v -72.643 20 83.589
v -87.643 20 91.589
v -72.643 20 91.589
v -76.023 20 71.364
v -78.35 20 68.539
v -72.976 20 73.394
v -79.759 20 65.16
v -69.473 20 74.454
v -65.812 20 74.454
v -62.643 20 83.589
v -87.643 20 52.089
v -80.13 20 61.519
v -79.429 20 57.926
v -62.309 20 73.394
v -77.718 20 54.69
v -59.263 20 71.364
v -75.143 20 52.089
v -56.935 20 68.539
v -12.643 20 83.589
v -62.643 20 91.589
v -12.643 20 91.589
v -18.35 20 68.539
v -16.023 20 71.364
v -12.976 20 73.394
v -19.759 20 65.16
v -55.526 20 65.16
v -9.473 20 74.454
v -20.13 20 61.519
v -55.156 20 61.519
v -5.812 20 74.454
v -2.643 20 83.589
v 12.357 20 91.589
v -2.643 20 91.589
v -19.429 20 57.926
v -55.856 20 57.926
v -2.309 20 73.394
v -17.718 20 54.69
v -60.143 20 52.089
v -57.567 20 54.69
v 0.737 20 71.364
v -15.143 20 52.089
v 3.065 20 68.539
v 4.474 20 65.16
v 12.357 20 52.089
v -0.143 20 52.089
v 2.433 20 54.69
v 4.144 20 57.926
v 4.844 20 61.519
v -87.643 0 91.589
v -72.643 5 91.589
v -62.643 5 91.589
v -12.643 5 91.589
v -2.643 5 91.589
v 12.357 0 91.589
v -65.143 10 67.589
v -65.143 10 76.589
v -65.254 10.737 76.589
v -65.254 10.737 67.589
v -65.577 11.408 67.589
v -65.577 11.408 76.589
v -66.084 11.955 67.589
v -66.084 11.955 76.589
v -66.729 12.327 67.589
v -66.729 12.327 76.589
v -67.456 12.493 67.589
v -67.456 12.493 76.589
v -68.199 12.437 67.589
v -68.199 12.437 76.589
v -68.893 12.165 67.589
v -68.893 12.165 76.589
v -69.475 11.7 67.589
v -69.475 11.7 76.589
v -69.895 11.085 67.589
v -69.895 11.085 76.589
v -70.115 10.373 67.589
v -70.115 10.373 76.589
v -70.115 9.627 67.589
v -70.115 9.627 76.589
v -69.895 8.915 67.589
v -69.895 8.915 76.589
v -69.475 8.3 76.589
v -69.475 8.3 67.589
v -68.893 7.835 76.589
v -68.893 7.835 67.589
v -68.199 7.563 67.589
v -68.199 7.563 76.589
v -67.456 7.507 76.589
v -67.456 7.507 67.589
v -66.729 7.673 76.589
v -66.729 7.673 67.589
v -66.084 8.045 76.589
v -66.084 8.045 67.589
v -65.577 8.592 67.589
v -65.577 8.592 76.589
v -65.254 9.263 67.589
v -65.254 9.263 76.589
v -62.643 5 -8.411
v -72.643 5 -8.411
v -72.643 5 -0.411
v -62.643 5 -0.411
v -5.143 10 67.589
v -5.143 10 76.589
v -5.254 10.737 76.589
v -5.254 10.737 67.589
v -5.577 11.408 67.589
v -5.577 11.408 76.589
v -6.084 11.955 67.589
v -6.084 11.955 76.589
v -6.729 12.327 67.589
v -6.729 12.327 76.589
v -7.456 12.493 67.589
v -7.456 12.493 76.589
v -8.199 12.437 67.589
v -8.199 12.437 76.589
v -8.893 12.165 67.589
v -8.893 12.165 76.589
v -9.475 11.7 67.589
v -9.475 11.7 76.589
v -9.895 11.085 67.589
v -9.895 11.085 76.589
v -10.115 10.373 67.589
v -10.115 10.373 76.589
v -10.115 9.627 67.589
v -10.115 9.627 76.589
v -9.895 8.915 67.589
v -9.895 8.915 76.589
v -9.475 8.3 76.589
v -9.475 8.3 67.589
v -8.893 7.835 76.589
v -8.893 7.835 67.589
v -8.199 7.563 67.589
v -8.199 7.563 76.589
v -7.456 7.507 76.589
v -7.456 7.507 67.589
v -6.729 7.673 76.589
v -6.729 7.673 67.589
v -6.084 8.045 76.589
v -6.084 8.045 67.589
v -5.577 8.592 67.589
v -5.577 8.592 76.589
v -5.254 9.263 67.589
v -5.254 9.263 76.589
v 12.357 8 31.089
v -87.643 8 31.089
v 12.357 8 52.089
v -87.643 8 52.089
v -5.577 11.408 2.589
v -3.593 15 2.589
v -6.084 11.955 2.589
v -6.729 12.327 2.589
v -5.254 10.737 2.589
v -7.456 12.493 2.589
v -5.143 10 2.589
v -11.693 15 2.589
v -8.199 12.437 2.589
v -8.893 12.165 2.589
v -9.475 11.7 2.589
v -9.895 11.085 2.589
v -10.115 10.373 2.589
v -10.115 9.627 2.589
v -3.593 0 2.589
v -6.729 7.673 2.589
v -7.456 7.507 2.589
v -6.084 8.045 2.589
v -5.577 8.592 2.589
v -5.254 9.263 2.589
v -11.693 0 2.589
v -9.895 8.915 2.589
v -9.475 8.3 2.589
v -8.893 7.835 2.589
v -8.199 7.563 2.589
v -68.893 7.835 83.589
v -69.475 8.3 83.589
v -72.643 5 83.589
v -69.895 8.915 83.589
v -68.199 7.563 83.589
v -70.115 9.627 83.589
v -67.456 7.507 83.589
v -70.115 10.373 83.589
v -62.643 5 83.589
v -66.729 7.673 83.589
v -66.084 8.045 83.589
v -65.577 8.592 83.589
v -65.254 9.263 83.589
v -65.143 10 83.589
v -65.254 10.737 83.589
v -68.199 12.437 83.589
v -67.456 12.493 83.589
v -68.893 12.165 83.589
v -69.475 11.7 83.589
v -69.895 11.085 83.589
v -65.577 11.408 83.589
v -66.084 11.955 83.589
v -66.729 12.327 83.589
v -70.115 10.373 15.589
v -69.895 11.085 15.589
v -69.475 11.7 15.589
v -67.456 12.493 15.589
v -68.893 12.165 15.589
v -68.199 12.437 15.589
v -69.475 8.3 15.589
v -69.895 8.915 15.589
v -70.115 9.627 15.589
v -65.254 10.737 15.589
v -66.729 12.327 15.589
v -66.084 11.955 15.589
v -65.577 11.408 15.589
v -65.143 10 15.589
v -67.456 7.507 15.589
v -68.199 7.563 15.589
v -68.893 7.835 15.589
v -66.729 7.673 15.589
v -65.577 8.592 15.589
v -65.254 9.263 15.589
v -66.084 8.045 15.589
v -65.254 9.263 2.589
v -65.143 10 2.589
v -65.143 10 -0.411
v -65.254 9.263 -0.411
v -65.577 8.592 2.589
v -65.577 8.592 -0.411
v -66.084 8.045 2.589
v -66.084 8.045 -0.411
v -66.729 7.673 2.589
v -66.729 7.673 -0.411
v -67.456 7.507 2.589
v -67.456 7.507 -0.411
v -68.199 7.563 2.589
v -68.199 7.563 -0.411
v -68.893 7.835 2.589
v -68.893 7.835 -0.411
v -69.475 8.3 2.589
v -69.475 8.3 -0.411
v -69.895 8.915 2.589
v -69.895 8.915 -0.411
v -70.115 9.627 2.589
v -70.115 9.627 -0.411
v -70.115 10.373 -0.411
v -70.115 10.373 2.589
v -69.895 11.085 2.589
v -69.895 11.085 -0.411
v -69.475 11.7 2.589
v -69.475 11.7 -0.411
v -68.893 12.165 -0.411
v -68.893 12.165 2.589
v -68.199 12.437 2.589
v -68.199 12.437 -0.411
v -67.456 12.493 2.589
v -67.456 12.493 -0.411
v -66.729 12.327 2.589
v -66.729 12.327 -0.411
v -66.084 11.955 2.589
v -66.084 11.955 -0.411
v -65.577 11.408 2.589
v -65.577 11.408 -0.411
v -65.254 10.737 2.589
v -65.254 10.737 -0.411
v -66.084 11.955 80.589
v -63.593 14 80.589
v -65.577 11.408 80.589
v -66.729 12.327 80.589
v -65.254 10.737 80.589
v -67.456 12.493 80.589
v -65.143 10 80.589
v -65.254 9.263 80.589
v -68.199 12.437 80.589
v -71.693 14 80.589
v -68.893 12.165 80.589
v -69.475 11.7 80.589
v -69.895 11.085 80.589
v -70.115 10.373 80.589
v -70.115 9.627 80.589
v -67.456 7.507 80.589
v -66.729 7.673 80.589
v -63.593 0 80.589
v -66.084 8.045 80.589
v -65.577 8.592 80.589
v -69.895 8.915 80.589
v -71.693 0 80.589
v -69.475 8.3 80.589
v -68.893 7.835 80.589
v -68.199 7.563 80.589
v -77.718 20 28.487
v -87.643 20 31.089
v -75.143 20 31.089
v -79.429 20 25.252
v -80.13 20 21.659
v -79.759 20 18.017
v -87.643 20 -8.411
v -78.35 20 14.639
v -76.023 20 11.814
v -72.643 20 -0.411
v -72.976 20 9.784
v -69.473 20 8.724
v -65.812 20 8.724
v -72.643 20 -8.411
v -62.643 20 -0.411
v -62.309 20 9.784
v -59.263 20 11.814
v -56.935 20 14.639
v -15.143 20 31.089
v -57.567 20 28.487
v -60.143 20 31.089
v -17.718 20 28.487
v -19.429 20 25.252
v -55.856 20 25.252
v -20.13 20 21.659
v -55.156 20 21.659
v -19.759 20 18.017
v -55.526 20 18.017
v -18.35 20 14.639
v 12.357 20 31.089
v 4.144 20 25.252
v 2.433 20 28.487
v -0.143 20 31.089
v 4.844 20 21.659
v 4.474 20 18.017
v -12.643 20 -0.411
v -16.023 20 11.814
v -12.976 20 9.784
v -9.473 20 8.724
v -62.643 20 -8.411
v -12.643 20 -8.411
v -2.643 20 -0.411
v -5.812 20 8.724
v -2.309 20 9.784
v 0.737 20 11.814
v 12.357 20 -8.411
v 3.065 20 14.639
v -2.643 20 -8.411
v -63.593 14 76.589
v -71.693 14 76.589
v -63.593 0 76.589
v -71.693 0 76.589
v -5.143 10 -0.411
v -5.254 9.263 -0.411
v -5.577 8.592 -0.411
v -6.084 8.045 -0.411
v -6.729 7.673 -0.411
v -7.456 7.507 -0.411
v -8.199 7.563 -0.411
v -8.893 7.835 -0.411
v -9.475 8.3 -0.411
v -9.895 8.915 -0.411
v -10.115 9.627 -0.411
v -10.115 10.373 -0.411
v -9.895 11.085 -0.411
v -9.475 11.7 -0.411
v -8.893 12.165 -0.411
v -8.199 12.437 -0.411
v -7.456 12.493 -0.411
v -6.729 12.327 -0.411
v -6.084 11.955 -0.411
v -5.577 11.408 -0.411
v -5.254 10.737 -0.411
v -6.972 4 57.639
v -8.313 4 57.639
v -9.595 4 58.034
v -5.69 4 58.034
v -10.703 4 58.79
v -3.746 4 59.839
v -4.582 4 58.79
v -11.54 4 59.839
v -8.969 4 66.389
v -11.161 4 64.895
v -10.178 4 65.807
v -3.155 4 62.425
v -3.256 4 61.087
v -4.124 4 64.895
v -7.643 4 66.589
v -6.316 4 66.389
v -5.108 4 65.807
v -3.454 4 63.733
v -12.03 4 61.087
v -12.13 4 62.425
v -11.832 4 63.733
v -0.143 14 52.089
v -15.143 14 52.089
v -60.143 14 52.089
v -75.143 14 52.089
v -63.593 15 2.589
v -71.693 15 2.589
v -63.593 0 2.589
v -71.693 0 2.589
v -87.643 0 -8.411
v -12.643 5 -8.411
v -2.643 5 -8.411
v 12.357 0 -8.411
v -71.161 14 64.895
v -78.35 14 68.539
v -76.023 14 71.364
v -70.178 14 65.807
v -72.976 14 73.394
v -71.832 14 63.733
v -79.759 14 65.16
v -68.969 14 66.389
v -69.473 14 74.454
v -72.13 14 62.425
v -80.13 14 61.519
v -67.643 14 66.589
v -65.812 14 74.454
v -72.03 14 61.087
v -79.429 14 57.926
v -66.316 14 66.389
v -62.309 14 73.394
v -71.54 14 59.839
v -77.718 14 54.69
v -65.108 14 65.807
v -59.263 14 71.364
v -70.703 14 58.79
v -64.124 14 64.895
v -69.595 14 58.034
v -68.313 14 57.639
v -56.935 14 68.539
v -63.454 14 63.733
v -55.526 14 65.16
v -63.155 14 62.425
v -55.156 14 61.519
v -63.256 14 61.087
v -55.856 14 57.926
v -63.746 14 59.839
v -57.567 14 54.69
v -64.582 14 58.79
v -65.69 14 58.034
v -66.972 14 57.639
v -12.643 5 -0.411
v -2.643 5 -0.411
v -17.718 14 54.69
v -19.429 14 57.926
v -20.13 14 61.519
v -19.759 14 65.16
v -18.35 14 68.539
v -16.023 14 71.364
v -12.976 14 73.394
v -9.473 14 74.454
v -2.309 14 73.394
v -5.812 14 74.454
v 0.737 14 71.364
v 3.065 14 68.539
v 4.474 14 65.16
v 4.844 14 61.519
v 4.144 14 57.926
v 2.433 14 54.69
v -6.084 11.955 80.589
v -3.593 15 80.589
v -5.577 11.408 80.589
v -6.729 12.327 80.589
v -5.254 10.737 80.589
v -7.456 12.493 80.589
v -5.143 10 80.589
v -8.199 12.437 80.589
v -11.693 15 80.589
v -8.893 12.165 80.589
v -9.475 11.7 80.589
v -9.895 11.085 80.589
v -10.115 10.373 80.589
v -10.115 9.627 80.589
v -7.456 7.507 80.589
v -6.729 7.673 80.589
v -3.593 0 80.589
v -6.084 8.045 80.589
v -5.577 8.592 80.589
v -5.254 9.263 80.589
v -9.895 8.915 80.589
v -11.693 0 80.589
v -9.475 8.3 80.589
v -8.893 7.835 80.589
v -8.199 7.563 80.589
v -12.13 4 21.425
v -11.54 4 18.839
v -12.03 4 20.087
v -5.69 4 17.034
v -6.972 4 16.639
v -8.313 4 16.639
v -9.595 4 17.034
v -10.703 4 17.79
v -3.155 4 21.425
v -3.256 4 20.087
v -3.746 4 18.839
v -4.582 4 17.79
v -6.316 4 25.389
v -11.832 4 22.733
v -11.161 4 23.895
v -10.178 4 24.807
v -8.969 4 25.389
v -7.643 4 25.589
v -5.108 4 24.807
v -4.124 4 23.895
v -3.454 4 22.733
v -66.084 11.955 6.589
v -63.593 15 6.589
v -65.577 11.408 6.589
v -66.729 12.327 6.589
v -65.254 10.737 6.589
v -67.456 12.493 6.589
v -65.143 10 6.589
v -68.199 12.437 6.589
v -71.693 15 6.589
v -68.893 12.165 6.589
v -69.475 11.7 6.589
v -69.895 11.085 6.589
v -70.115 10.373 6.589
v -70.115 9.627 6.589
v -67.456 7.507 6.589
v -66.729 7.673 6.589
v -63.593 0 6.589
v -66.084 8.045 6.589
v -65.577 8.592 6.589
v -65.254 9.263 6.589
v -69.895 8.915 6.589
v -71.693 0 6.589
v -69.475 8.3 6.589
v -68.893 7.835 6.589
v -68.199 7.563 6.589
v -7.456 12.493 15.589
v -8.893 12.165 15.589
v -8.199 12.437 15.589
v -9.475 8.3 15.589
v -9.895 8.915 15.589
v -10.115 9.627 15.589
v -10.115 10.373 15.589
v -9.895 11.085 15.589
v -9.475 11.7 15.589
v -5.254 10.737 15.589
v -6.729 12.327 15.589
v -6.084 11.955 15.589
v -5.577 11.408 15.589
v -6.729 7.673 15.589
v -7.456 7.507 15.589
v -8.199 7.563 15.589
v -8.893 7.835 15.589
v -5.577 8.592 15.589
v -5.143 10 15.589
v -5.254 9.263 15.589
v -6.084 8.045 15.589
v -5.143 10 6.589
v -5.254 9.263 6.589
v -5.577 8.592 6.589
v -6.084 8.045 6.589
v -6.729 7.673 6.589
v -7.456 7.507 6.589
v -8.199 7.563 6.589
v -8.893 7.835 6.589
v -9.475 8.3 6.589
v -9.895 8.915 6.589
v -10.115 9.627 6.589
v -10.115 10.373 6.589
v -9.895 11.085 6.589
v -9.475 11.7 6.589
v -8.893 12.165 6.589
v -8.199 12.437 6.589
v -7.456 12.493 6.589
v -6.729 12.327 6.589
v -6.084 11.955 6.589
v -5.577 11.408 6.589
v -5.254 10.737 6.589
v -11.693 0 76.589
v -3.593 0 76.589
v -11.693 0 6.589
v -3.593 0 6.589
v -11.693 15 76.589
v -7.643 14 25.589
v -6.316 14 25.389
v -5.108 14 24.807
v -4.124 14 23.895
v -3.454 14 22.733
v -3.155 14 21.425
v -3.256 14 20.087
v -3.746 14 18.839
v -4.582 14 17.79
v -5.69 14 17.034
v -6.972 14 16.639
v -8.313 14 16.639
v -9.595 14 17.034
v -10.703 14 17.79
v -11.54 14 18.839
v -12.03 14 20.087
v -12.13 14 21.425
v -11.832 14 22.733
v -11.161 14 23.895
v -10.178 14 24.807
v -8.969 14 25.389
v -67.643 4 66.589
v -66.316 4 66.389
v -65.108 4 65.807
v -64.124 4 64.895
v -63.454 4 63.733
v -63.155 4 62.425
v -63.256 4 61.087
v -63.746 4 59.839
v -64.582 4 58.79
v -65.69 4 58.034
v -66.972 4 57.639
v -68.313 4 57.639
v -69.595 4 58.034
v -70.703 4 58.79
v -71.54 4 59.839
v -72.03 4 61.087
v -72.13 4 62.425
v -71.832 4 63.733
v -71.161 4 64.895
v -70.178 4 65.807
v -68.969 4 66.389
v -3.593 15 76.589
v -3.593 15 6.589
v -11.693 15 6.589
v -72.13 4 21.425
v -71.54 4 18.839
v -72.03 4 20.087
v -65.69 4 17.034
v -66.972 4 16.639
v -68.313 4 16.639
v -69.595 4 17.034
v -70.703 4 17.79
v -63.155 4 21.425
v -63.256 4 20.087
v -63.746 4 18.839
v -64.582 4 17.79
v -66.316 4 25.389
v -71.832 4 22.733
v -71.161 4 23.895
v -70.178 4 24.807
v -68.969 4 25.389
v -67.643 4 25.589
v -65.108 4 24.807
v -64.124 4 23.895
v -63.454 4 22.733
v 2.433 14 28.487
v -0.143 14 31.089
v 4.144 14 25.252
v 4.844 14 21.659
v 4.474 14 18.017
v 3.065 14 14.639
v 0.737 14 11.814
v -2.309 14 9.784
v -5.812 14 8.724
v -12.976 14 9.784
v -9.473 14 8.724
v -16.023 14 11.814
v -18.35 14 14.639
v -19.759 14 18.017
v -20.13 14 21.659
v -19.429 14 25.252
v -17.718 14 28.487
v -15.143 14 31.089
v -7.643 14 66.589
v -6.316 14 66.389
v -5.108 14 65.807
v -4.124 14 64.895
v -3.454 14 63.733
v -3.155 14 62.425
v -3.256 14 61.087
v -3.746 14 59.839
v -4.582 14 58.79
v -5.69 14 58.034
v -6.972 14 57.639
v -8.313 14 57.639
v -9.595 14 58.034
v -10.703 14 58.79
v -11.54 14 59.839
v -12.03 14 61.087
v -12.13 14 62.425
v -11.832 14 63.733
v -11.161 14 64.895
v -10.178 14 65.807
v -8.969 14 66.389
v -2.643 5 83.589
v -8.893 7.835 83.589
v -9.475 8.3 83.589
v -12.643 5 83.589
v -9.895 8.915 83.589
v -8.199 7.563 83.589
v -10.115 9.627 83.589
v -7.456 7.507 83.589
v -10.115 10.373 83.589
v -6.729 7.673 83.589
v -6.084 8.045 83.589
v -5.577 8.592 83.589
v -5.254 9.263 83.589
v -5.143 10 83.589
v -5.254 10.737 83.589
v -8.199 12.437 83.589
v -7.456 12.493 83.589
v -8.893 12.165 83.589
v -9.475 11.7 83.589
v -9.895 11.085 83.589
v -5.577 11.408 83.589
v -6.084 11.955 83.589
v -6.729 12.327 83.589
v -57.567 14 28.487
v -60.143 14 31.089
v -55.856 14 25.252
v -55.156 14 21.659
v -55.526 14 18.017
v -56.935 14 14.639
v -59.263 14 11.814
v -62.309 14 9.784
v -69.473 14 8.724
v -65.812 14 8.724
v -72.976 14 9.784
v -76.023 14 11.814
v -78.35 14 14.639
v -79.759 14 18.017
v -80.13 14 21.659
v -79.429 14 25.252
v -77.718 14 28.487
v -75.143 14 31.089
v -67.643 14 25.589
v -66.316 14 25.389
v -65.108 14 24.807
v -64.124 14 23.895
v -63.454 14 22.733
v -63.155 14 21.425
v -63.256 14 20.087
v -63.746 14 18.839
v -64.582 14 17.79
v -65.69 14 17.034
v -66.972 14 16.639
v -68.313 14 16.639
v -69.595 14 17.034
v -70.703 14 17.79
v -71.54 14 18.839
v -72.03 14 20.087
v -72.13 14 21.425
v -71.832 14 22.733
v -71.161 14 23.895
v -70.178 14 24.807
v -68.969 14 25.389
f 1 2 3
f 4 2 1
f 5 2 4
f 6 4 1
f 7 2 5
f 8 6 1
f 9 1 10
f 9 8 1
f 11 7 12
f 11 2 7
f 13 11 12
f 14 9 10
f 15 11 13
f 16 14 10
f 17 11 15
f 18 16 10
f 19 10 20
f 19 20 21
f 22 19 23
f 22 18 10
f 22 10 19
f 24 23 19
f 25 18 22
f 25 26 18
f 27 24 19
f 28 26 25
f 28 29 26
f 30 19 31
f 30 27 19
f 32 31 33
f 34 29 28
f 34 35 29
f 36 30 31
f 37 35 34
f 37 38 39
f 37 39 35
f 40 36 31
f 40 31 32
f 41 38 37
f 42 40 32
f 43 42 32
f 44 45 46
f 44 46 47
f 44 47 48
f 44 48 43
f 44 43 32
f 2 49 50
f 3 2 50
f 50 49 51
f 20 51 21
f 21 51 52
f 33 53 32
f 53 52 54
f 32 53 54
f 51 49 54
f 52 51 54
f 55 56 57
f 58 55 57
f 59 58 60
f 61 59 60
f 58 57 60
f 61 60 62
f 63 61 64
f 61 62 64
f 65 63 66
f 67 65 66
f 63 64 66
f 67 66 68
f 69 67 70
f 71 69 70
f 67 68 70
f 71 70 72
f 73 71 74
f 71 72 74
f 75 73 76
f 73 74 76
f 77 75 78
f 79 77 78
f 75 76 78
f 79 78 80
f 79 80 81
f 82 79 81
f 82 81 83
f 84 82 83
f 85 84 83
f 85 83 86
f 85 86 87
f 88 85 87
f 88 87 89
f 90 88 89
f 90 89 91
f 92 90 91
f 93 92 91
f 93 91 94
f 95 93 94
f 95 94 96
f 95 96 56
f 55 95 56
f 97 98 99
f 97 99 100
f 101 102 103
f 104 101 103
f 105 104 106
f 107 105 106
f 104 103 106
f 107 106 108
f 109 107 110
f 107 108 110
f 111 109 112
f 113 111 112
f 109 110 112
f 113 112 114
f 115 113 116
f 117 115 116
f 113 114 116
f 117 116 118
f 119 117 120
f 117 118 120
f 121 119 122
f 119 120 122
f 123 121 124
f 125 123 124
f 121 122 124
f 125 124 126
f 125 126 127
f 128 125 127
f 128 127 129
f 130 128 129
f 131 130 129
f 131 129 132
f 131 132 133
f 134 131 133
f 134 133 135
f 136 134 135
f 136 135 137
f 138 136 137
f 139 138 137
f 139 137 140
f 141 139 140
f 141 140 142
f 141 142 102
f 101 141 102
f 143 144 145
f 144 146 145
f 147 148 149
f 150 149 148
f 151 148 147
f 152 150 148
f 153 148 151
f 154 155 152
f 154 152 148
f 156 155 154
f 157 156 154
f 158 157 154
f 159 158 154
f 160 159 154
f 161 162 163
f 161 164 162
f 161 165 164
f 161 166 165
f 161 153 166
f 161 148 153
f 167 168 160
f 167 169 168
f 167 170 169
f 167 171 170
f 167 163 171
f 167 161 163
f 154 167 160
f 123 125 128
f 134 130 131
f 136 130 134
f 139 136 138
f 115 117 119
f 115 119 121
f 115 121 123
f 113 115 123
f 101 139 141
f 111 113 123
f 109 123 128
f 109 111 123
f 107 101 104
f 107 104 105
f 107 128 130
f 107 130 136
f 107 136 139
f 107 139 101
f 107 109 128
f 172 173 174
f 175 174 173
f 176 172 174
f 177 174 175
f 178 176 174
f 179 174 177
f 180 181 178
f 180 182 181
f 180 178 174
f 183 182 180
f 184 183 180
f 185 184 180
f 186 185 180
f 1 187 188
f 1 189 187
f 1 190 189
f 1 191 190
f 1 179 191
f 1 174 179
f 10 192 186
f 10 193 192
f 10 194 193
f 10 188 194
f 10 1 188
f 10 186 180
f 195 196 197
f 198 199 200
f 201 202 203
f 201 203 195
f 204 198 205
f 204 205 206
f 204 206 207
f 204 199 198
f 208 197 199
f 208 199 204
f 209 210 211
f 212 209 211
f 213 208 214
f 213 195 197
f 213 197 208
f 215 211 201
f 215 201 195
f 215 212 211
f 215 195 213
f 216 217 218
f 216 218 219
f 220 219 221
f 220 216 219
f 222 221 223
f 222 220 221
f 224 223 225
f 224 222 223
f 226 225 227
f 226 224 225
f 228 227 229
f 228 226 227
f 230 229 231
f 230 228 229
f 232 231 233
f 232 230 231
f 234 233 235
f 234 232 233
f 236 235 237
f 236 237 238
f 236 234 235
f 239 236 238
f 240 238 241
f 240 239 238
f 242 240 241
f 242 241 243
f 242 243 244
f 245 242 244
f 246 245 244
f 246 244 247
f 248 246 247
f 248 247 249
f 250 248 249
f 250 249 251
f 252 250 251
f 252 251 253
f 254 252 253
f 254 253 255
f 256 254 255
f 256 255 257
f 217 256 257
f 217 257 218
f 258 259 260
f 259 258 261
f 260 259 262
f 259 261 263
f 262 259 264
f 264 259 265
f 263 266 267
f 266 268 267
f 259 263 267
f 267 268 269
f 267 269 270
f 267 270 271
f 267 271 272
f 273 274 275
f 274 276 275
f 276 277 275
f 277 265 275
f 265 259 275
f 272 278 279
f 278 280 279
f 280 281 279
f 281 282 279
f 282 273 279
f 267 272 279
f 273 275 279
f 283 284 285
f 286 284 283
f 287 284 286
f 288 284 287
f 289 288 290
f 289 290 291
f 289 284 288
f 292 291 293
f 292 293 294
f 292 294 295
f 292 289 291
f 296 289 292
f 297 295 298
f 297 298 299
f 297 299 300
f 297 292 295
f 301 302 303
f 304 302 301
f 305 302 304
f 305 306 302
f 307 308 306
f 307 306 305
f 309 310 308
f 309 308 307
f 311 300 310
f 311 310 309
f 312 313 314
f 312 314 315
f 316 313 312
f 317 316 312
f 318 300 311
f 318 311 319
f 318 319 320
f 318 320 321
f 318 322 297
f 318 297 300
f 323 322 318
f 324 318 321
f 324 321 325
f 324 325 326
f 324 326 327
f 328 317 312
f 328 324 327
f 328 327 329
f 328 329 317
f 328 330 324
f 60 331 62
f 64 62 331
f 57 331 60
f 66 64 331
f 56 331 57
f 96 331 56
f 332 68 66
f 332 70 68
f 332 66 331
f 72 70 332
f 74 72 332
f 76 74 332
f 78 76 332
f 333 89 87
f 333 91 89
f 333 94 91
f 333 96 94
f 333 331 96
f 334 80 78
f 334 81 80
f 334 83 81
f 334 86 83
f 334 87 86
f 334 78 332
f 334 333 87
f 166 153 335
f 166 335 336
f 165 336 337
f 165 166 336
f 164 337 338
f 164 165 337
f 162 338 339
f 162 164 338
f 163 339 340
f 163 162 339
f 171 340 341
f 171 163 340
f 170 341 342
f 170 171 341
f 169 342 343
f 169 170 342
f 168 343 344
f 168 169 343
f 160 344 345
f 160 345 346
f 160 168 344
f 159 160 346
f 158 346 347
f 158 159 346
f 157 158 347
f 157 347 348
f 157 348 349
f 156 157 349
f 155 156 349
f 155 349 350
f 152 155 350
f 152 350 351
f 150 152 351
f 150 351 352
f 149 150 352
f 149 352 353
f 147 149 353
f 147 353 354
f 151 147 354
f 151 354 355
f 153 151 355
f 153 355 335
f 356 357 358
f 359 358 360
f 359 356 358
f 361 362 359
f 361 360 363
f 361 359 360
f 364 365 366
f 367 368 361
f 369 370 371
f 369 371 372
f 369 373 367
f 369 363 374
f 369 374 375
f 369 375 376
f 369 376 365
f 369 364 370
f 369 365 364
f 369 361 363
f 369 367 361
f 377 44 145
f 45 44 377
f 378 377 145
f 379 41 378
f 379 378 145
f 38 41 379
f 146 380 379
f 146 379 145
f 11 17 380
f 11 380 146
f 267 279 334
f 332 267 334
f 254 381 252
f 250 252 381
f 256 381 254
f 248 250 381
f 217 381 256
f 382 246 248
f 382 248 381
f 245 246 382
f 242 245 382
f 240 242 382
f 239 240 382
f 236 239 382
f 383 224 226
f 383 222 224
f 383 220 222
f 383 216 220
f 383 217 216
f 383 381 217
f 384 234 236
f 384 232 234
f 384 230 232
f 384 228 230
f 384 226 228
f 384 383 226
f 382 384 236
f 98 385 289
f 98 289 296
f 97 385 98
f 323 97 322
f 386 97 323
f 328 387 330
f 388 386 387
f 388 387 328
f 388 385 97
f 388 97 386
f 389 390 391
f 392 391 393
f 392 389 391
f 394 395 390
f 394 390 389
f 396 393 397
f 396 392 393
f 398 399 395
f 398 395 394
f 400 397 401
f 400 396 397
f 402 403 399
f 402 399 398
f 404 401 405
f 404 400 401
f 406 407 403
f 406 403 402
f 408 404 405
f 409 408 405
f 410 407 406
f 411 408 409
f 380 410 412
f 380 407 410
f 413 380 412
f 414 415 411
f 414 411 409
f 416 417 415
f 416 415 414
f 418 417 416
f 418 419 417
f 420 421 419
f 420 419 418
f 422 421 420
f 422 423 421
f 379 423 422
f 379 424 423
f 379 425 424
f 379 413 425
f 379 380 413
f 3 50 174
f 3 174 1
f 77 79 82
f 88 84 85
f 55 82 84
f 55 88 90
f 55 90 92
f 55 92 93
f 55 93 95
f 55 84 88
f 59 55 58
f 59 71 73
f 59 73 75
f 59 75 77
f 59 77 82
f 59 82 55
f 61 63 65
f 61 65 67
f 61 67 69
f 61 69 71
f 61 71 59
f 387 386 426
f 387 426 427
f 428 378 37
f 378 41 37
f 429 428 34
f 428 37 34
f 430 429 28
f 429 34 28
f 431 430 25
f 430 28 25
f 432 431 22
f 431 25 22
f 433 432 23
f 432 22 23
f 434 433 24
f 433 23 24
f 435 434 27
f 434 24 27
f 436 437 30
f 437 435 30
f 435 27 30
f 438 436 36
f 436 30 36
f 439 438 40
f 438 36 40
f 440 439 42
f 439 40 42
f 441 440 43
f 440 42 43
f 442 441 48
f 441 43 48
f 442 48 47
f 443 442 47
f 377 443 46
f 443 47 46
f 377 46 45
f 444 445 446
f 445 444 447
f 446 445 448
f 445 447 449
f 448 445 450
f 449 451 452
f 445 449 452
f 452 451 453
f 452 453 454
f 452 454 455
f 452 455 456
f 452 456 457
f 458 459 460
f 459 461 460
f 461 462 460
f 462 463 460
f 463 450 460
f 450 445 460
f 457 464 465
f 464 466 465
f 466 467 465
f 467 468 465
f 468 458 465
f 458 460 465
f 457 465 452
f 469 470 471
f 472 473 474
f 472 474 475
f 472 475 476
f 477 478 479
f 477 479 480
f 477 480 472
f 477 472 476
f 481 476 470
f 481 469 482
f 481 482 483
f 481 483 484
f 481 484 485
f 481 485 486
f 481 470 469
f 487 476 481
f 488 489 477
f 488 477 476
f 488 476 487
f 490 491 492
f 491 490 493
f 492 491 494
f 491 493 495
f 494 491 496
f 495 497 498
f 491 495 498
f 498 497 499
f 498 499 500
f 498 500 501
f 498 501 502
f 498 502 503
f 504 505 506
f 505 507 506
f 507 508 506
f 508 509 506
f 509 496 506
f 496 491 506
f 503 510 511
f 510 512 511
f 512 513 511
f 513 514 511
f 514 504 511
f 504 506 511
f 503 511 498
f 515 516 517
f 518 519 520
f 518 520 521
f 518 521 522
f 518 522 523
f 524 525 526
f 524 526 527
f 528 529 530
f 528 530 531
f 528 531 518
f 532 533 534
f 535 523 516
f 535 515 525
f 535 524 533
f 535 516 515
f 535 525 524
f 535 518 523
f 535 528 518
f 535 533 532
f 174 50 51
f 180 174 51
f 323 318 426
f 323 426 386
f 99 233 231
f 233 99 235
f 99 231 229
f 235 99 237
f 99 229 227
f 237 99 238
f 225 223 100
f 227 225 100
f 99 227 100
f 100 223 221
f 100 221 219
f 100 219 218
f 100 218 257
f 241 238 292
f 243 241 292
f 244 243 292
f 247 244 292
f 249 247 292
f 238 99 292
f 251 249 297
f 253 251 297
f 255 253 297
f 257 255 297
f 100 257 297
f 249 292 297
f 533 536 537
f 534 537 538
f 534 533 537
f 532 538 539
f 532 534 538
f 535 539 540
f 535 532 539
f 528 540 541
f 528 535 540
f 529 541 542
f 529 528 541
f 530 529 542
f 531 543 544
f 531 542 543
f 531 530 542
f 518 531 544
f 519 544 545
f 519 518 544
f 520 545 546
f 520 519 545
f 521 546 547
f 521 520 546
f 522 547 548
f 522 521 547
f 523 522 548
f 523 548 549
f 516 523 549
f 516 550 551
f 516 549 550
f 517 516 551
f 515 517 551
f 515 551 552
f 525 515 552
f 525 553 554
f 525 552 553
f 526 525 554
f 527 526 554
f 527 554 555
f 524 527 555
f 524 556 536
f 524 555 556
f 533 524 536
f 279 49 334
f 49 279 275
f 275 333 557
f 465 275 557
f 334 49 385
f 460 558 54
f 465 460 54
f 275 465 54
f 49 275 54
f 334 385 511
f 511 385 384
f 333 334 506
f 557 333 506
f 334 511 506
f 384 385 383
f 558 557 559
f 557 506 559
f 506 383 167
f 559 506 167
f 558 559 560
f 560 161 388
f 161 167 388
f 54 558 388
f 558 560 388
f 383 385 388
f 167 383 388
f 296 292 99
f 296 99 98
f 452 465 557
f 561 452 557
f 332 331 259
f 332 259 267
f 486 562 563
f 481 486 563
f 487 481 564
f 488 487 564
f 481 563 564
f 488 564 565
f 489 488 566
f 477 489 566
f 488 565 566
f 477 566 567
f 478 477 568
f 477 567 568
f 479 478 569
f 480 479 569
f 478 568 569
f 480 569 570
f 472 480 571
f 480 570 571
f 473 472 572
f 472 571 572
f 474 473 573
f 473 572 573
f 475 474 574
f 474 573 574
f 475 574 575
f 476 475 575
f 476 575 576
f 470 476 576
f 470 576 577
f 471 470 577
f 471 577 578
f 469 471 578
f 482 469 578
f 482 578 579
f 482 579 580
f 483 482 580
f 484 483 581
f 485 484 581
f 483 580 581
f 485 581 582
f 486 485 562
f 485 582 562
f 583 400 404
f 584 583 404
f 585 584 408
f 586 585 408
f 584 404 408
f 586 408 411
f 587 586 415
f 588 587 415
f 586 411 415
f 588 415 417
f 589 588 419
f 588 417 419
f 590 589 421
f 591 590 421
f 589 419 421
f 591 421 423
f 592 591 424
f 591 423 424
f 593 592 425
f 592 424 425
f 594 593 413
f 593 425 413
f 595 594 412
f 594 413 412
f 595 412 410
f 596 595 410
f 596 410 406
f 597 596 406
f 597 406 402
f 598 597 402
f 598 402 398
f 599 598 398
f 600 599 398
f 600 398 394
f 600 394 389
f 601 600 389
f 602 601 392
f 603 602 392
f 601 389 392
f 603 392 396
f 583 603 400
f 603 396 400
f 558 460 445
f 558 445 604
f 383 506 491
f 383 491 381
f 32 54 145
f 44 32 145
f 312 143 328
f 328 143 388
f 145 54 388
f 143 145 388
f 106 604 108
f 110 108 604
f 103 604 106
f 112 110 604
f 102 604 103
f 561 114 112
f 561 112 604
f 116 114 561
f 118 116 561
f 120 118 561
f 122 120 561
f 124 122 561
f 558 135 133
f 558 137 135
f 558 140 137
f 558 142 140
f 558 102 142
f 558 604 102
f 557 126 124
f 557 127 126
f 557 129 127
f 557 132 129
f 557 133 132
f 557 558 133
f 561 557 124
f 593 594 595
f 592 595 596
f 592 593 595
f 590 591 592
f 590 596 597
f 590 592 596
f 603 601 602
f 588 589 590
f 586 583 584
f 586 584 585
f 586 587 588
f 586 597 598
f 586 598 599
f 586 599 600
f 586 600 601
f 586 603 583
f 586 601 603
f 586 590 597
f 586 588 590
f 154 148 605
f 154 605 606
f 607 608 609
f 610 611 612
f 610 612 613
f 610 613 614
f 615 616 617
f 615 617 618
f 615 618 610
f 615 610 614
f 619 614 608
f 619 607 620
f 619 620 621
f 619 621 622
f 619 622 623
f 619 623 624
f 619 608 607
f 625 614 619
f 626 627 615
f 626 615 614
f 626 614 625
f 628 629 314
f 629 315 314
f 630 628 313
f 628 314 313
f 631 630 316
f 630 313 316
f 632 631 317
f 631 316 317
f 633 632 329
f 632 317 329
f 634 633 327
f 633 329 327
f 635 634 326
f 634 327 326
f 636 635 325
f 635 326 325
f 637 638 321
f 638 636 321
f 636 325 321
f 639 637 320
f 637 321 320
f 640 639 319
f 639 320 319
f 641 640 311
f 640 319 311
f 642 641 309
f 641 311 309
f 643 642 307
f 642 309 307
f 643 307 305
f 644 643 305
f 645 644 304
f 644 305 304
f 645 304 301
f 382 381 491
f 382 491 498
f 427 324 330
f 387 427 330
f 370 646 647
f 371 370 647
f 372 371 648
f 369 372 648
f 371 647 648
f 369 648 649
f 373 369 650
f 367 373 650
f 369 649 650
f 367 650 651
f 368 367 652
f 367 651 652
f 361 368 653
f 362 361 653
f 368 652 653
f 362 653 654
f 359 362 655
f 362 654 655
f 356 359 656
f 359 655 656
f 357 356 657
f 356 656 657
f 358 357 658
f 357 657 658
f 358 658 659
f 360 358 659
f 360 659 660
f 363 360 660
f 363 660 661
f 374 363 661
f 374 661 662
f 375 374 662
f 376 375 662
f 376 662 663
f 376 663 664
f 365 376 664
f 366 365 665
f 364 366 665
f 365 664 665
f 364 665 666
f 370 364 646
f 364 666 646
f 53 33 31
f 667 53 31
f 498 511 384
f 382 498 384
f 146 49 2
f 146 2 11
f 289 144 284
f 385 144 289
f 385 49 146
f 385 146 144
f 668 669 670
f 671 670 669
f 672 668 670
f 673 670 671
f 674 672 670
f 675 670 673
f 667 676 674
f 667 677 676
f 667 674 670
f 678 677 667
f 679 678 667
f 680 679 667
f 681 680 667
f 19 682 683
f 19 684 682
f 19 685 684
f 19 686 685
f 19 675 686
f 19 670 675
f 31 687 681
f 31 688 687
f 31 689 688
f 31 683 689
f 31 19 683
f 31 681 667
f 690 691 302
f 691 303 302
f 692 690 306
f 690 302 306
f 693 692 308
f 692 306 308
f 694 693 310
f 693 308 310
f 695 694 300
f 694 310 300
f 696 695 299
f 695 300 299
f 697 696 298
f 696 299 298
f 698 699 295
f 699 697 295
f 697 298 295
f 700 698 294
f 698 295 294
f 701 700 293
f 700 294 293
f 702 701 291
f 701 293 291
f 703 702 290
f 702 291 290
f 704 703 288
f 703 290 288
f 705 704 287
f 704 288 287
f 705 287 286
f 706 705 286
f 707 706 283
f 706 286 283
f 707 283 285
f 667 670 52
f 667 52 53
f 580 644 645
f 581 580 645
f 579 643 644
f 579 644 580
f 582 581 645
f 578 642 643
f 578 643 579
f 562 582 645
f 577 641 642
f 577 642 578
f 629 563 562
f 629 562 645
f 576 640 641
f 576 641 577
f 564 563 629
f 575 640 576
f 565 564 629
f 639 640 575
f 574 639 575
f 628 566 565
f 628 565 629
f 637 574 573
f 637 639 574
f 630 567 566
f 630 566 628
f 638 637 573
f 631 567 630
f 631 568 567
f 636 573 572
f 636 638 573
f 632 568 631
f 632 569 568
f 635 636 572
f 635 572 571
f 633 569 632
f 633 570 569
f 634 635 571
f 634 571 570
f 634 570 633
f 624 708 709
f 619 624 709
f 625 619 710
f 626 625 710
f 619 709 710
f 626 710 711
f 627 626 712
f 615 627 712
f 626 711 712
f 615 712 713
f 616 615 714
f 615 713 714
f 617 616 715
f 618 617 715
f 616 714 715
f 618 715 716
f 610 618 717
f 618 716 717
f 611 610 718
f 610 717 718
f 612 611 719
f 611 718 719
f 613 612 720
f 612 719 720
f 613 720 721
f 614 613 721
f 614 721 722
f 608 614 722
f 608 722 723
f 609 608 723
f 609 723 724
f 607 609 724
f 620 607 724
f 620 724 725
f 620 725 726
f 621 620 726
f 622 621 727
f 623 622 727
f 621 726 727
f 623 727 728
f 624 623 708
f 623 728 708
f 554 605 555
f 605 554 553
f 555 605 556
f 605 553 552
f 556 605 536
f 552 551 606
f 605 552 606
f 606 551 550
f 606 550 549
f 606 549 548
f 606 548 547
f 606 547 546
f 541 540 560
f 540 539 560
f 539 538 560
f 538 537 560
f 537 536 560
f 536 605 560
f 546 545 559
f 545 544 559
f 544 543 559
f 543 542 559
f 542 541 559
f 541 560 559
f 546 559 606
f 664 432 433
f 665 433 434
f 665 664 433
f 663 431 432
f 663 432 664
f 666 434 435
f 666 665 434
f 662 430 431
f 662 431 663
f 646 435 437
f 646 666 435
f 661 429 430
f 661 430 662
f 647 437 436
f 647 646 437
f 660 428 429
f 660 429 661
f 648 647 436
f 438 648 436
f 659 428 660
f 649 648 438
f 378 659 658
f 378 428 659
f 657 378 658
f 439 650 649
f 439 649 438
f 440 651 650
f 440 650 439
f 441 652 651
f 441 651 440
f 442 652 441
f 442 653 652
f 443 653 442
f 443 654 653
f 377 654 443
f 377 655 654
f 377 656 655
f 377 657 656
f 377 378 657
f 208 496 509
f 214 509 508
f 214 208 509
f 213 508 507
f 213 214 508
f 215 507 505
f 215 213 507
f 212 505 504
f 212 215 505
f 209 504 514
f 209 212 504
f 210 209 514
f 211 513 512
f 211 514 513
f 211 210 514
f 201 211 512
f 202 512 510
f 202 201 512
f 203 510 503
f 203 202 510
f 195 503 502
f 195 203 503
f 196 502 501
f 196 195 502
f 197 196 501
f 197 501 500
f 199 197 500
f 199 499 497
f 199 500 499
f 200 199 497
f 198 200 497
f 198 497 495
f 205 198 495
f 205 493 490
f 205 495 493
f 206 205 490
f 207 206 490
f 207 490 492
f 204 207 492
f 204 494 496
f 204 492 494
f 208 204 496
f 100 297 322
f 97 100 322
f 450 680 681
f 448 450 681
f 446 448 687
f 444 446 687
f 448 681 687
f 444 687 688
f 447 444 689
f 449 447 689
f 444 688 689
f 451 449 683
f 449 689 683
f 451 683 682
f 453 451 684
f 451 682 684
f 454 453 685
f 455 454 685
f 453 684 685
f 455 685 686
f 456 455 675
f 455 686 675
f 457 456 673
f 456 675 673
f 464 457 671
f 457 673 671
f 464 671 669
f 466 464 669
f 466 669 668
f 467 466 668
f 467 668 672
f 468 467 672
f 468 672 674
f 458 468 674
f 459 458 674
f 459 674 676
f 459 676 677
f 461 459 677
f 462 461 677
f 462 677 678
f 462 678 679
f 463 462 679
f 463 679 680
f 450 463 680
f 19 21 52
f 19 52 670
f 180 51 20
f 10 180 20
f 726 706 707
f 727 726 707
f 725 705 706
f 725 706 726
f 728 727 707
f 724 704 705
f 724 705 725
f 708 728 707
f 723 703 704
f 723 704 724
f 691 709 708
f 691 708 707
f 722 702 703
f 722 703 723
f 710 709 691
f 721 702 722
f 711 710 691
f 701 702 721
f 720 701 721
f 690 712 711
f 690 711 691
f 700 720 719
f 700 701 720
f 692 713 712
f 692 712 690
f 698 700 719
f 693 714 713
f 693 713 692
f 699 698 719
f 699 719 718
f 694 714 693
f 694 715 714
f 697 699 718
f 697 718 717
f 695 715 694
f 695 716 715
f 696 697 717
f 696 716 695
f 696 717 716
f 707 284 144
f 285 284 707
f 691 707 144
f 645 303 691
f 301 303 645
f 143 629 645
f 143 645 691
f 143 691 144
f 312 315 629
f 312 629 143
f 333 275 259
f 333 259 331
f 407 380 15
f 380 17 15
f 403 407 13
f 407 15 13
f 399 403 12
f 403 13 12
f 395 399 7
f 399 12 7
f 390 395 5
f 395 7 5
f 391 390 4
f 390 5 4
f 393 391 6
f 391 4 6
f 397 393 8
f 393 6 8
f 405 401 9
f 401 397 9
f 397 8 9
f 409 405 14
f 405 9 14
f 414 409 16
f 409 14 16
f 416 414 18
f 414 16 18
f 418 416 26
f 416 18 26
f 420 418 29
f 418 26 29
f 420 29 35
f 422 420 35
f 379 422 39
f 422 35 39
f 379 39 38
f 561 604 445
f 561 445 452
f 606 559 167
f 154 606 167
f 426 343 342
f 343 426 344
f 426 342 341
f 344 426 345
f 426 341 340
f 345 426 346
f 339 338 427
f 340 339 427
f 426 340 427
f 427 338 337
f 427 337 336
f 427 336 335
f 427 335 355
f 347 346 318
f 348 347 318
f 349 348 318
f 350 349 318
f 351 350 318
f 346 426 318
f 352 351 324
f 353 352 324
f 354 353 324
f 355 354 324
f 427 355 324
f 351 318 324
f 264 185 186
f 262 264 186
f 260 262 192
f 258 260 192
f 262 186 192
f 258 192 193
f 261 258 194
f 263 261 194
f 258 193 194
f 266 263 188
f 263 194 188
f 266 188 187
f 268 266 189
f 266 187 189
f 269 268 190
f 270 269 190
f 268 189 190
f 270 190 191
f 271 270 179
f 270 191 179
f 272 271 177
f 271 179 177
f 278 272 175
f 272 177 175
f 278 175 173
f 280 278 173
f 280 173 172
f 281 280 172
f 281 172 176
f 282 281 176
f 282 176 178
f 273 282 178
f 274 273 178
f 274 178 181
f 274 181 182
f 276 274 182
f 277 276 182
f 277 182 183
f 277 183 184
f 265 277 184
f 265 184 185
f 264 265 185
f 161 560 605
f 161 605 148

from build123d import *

# Parameters (mm, degrees)
SKETCH2_W           = 100
SKETCH2_H           = 100
BOSS_EXTRUDE1_DEPTH = 20
SKETCH3_W           = 100
SKETCH3_H           = 20
CUT_EXTRUDE1_DEPTH  = 12
SKETCH5_R           = 12.5
CUT_EXTRUDE2_DEPTH  = 6
SKETCH6_R           = 12.5
CUT_EXTRUDE3_DEPTH  = 6
SKETCH7_R           = 12.5
CUT_EXTRUDE4_DEPTH  = 6
SKETCH8_R           = 12.5
CUT_EXTRUDE5_DEPTH  = 6
SKETCH9_R           = 4.5
CUT_EXTRUDE6_DEPTH  = 10
SKETCH10_R          = 4.5
CUT_EXTRUDE7_DEPTH  = 10
SKETCH11_R          = 4.5
CUT_EXTRUDE8_DEPTH  = 10
SKETCH12_R          = 4.5
CUT_EXTRUDE9_DEPTH  = 10
SKETCH13_W          = 10
SKETCH13_H          = 15
CUT_EXTRUDE11_DEPTH = 8
SKETCH15_R          = 2.5
CUT_EXTRUDE13_DEPTH = 16
SKETCH16_W          = 8.1
SKETCH16_H          = 4
CUT_EXTRUDE14_DEPTH = 14
SKETCH17_W          = 10
SKETCH17_H          = 8
CUT_EXTRUDE16_DEPTH = 15
SKETCH19_R          = 2.5
CUT_EXTRUDE17_DEPTH = 16
SKETCH21_W          = 10
SKETCH21_H          = 8
CUT_EXTRUDE19_DEPTH = 15
SKETCH22_W          = 10
SKETCH22_H          = 8
CUT_EXTRUDE20_DEPTH = 15
CUT_EXTRUDE21_START = -16
SKETCH23_R          = 2.5
CUT_EXTRUDE21_DEPTH = 16
CUT_EXTRUDE22_START = -16
SKETCH24_R          = 2.5
CUT_EXTRUDE22_DEPTH = 16
SKETCH25_W          = 8.1
SKETCH25_H          = 4
CUT_EXTRUDE23_DEPTH = 15
SKETCH26_W          = 8.1
SKETCH26_H          = 4
CUT_EXTRUDE24_DEPTH = 15
SKETCH27_W          = 8.1
SKETCH27_H          = 4
CUT_EXTRUDE25_DEPTH = 15
SKETCH28_W          = 100
SKETCH28_H          = 12
CUT_EXTRUDE26_DEPTH = 0.5
SKETCH29_W          = 100
SKETCH29_H          = 12
CUT_EXTRUDE27_DEPTH = 0.5


with BuildPart() as part:
    # Sketch2 → Boss-Extrude1 (new body)
    with BuildSketch(Plane(origin=(0, 0, 0), x_dir=(1, 0, 0), z_dir=(0, 1, 0))):
        with Locations((-37.64268429, -41.588796838)):
            Rectangle(SKETCH2_W, SKETCH2_H)
    extrude(amount=BOSS_EXTRUDE1_DEPTH)

    # Sketch3 → Cut-Extrude1 (cut)
    with BuildSketch(Plane(origin=(0, 20, 0), x_dir=(1, 0, 0), z_dir=(0, 1, 0))):
        with Locations((-37.64268429, -41.588796838)):
            Rectangle(SKETCH3_W, SKETCH3_H)
    extrude(amount=-CUT_EXTRUDE1_DEPTH, mode=Mode.SUBTRACT)

    # Sketch5 → Cut-Extrude2 (cut)
    with BuildSketch(Plane(origin=(0, 20, 0), x_dir=(1, 0, 0), z_dir=(0, 1, 0))):
        with Locations((-7.64268429, -62.088796838)):
            Circle(SKETCH5_R)
    extrude(amount=-CUT_EXTRUDE2_DEPTH, mode=Mode.SUBTRACT)

    # Sketch6 → Cut-Extrude3 (cut)
    with BuildSketch(Plane(origin=(0, 20, 0), x_dir=(1, 0, 0), z_dir=(0, 1, 0))):
        with Locations((-67.64268429, -62.088796838)):
            Circle(SKETCH6_R)
    extrude(amount=-CUT_EXTRUDE3_DEPTH, mode=Mode.SUBTRACT)

    # Sketch7 → Cut-Extrude4 (cut)
    with BuildSketch(Plane(origin=(0, 20, 0), x_dir=(1, 0, 0), z_dir=(0, 1, 0))):
        with Locations((-67.64268429, -21.088796838)):
            Circle(SKETCH7_R)
    extrude(amount=-CUT_EXTRUDE4_DEPTH, mode=Mode.SUBTRACT)

    # Sketch8 → Cut-Extrude5 (cut)
    with BuildSketch(Plane(origin=(0, 20, 0), x_dir=(1, 0, 0), z_dir=(0, 1, 0))):
        with Locations((-7.64268429, -21.088796838)):
            Circle(SKETCH8_R)
    extrude(amount=-CUT_EXTRUDE5_DEPTH, mode=Mode.SUBTRACT)

    # Sketch9 → Cut-Extrude6 (cut)
    with BuildSketch(Plane(origin=(0, 14, 0), x_dir=(1, 0, 0), z_dir=(0, 1, 0))):
        with Locations(Location((-67.64268429, -21.088796838, 0), (0, 0, 270))):
            Circle(SKETCH9_R)
    extrude(amount=-CUT_EXTRUDE6_DEPTH, mode=Mode.SUBTRACT)

    # Sketch10 → Cut-Extrude7 (cut)
    with BuildSketch(Plane(origin=(0, 14, 0), x_dir=(1, 0, 0), z_dir=(0, 1, 0))):
        with Locations(Location((-7.64268429, -21.088796838, 0), (0, 0, 270))):
            Circle(SKETCH10_R)
    extrude(amount=-CUT_EXTRUDE7_DEPTH, mode=Mode.SUBTRACT)

    # Sketch11 → Cut-Extrude8 (cut)
    with BuildSketch(Plane(origin=(0, 14, 0), x_dir=(1, 0, 0), z_dir=(0, 1, 0))):
        with Locations(Location((-7.64268429, -62.088796838, 0), (0, 0, 270))):
            Circle(SKETCH11_R)
    extrude(amount=-CUT_EXTRUDE8_DEPTH, mode=Mode.SUBTRACT)

    # Sketch12 → Cut-Extrude9 (cut)
    with BuildSketch(Plane(origin=(0, 14, 0), x_dir=(1, 0, 0), z_dir=(0, 1, 0))):
        with Locations(Location((-67.64268429, -62.088796838, 0), (0, 0, 270))):
            Circle(SKETCH12_R)
    extrude(amount=-CUT_EXTRUDE9_DEPTH, mode=Mode.SUBTRACT)

    # Sketch13 → Cut-Extrude11 (cut)
    with BuildSketch(Plane.XY.offset(91.588796838)):
        with Locations((-67.64268429, 12.5)):
            Rectangle(SKETCH13_W, SKETCH13_H)
    extrude(amount=-CUT_EXTRUDE11_DEPTH, mode=Mode.SUBTRACT)

    # Sketch15 → Cut-Extrude13 (cut)
    with BuildSketch(Plane.XY.offset(83.588796838)):
        with Locations((-67.64268429, 10)):
            Circle(SKETCH15_R)
    extrude(amount=-CUT_EXTRUDE13_DEPTH, mode=Mode.SUBTRACT)

    # Sketch16 → Cut-Extrude14 (cut)
    with BuildSketch(Plane(origin=(0, 0, 0), x_dir=(-1, 0, 0), z_dir=(0, -1, 0))):
        with Locations((67.64268429, -78.588796838)):
            Rectangle(SKETCH16_W, SKETCH16_H)
    extrude(amount=-CUT_EXTRUDE14_DEPTH, mode=Mode.SUBTRACT)

    # Sketch17 → Cut-Extrude16 (cut)
    with BuildSketch(Plane(origin=(0, 20, 0), x_dir=(1, 0, 0), z_dir=(0, 1, 0))):
        with Locations((-7.64268429, -87.588796838)):
            Rectangle(SKETCH17_W, SKETCH17_H)
    extrude(amount=-CUT_EXTRUDE16_DEPTH, mode=Mode.SUBTRACT)

    # Sketch19 → Cut-Extrude17 (cut)
    with BuildSketch(Plane.XY.offset(83.588796838)):
        with Locations((-7.64268429, 10)):
            Circle(SKETCH19_R)
    extrude(amount=-CUT_EXTRUDE17_DEPTH, mode=Mode.SUBTRACT)

    # Sketch21 → Cut-Extrude19 (cut)
    with BuildSketch(Plane(origin=(0, 20, 0), x_dir=(1, 0, 0), z_dir=(0, 1, 0))):
        with Locations((-67.64268429, 4.411203162)):
            Rectangle(SKETCH21_W, SKETCH21_H)
    extrude(amount=-CUT_EXTRUDE19_DEPTH, mode=Mode.SUBTRACT)

    # Sketch22 → Cut-Extrude20 (cut)
    with BuildSketch(Plane(origin=(0, 20, 0), x_dir=(1, 0, 0), z_dir=(0, 1, 0))):
        with Locations((-7.64268429, 4.411203162)):
            Rectangle(SKETCH22_W, SKETCH22_H)
    extrude(amount=-CUT_EXTRUDE20_DEPTH, mode=Mode.SUBTRACT)

    # Sketch23 → Cut-Extrude21 (cut)
    with BuildSketch(Plane(origin=(0, 0, -0.411203162), x_dir=(-1, 0, 0), z_dir=(0, 0, -1)).offset(CUT_EXTRUDE21_START)):
        with Locations(Location((7.64268429, 10, 0), (0, 0, 180))):
            Circle(SKETCH23_R)
    extrude(amount=CUT_EXTRUDE21_DEPTH, mode=Mode.SUBTRACT)

    # Sketch24 → Cut-Extrude22 (cut)
    with BuildSketch(Plane(origin=(0, 0, -0.411203162), x_dir=(-1, 0, 0), z_dir=(0, 0, -1)).offset(CUT_EXTRUDE22_START)):
        with Locations(Location((67.64268429, 10, 0), (0, 0, 180))):
            Circle(SKETCH24_R)
    extrude(amount=CUT_EXTRUDE22_DEPTH, mode=Mode.SUBTRACT)

    # Sketch25 → Cut-Extrude23 (cut)
    with BuildSketch(Plane(origin=(0, 0, 0), x_dir=(-1, 0, 0), z_dir=(0, -1, 0))):
        with Locations((7.64268429, -78.588796838)):
            Rectangle(SKETCH25_W, SKETCH25_H)
    extrude(amount=-CUT_EXTRUDE23_DEPTH, mode=Mode.SUBTRACT)

    # Sketch26 → Cut-Extrude24 (cut)
    with BuildSketch(Plane(origin=(0, 0, 0), x_dir=(-1, 0, 0), z_dir=(0, -1, 0))):
        with Locations((7.64268429, -4.588796838)):
            Rectangle(SKETCH26_W, SKETCH26_H)
    extrude(amount=-CUT_EXTRUDE24_DEPTH, mode=Mode.SUBTRACT)

    # Sketch27 → Cut-Extrude25 (cut)
    with BuildSketch(Plane(origin=(0, 0, 0), x_dir=(-1, 0, 0), z_dir=(0, -1, 0))):
        with Locations((67.64268429, -4.588796838)):
            Rectangle(SKETCH27_W, SKETCH27_H)
    extrude(amount=-CUT_EXTRUDE25_DEPTH, mode=Mode.SUBTRACT)

    # Sketch28 → Cut-Extrude26 (cut)
    with BuildSketch(Plane.XY.offset(31.588796838)):
        with Locations((-37.64268429, 14)):
            Rectangle(SKETCH28_W, SKETCH28_H)
    extrude(amount=-CUT_EXTRUDE26_DEPTH, mode=Mode.SUBTRACT)

    # Sketch29 → Cut-Extrude27 (cut)
    with BuildSketch(Plane(origin=(0, 0, 51.588796838), x_dir=(-1, 0, 0), z_dir=(0, 0, -1))):
        with Locations((37.64268429, 14)):
            Rectangle(SKETCH29_W, SKETCH29_H)
    extrude(amount=-CUT_EXTRUDE27_DEPTH, mode=Mode.SUBTRACT)


solid = part.part
